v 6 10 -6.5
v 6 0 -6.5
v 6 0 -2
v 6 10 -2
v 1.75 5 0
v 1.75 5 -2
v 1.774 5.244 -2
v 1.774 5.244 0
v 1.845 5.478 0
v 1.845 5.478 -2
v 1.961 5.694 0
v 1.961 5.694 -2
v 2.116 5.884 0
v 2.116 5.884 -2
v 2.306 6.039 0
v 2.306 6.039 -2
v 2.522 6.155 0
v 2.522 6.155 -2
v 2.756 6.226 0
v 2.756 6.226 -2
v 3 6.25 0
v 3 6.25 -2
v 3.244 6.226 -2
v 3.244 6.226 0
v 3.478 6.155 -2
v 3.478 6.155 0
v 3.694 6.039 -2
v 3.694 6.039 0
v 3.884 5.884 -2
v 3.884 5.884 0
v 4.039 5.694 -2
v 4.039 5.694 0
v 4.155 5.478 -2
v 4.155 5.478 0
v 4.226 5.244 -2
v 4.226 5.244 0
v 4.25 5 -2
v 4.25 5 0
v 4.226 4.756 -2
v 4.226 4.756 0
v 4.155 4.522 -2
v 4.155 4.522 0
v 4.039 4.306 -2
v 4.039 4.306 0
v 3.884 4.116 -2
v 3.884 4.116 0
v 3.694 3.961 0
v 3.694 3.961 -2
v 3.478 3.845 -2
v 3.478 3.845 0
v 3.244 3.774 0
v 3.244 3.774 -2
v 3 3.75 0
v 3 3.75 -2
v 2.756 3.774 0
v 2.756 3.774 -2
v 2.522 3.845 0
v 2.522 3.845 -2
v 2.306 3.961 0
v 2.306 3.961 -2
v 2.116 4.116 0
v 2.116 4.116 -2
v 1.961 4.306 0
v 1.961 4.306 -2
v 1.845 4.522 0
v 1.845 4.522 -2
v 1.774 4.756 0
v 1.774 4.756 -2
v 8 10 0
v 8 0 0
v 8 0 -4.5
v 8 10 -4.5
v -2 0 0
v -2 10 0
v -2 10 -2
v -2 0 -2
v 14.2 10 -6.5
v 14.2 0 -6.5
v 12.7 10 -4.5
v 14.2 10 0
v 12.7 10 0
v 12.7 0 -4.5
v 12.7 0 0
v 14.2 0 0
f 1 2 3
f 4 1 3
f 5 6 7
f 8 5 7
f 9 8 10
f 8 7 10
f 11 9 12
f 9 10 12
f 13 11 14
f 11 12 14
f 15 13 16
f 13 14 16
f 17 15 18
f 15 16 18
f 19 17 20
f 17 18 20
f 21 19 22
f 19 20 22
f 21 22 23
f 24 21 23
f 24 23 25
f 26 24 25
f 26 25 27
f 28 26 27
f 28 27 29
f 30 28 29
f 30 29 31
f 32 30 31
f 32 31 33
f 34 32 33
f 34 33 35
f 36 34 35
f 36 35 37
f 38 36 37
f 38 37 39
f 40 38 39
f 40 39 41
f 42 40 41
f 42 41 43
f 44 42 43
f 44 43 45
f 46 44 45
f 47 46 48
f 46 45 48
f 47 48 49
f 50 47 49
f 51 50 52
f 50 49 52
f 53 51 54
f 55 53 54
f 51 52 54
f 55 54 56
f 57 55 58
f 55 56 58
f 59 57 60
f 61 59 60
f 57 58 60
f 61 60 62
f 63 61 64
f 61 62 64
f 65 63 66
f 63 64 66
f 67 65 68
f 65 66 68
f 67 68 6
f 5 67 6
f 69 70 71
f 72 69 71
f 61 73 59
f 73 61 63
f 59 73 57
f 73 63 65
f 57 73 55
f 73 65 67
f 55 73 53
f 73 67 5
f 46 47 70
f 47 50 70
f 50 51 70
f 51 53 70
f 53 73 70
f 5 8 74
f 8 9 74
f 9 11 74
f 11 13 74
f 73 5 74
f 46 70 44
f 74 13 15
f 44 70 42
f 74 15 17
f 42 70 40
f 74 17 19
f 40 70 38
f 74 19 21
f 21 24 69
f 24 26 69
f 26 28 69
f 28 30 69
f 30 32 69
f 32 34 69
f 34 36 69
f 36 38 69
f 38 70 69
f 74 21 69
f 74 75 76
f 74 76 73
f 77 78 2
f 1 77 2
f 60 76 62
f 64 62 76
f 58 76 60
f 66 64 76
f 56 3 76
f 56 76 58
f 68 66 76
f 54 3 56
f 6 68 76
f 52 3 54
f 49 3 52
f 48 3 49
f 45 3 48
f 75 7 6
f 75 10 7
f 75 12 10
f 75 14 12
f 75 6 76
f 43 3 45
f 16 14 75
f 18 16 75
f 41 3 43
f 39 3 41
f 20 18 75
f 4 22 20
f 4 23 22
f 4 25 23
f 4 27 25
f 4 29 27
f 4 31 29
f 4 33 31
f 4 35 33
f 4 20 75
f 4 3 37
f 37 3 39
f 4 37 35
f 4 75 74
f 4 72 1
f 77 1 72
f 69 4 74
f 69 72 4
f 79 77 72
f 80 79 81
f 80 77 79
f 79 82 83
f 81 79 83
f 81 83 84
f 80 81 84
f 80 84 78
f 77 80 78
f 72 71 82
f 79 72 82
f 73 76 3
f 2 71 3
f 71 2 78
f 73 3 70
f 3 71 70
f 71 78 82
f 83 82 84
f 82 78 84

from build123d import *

# Parameters (mm, degrees)
SALIENTE_EXTRUIR1_DEPTH = 10
CROQUIS2_R              = 1.25
CORTAR_EXTRUIR1_DEPTH   = 10
CROQUIS3_W              = 2
CROQUIS3_H              = 10
SALIENTE_EXTRUIR2_DEPTH = 2


with BuildPart() as part:
    # Croquis1 → Saliente-Extruir1 (new body)
    with BuildSketch(Plane(origin=(0, 0, 0), x_dir=(1, 0, 0), z_dir=(0, 1, 0))):
        Polygon((0, 0), (8, 0), (8, 4.5), (12.7, 4.5), (12.7, 0), (14.2, 0), (14.2, 6.5), (6, 6.5), (6, 2), (0, 2), align=None)
    extrude(amount=SALIENTE_EXTRUIR1_DEPTH)

    # Croquis2 → Cortar-Extruir1 (cut)
    with BuildSketch(Plane(origin=(0, 0, -2), x_dir=(-1, 0, 0), z_dir=(0, 0, -1))):
        with Locations((-3, 5)):
            Circle(CROQUIS2_R)
    extrude(amount=-CORTAR_EXTRUIR1_DEPTH, mode=Mode.SUBTRACT)

    # Croquis3 → Saliente-Extruir2 (add)
    with BuildSketch(Plane.ZY):
        with Locations((-1, 5)):
            Rectangle(CROQUIS3_W, CROQUIS3_H)
    extrude(amount=SALIENTE_EXTRUIR2_DEPTH)


solid = part.part
